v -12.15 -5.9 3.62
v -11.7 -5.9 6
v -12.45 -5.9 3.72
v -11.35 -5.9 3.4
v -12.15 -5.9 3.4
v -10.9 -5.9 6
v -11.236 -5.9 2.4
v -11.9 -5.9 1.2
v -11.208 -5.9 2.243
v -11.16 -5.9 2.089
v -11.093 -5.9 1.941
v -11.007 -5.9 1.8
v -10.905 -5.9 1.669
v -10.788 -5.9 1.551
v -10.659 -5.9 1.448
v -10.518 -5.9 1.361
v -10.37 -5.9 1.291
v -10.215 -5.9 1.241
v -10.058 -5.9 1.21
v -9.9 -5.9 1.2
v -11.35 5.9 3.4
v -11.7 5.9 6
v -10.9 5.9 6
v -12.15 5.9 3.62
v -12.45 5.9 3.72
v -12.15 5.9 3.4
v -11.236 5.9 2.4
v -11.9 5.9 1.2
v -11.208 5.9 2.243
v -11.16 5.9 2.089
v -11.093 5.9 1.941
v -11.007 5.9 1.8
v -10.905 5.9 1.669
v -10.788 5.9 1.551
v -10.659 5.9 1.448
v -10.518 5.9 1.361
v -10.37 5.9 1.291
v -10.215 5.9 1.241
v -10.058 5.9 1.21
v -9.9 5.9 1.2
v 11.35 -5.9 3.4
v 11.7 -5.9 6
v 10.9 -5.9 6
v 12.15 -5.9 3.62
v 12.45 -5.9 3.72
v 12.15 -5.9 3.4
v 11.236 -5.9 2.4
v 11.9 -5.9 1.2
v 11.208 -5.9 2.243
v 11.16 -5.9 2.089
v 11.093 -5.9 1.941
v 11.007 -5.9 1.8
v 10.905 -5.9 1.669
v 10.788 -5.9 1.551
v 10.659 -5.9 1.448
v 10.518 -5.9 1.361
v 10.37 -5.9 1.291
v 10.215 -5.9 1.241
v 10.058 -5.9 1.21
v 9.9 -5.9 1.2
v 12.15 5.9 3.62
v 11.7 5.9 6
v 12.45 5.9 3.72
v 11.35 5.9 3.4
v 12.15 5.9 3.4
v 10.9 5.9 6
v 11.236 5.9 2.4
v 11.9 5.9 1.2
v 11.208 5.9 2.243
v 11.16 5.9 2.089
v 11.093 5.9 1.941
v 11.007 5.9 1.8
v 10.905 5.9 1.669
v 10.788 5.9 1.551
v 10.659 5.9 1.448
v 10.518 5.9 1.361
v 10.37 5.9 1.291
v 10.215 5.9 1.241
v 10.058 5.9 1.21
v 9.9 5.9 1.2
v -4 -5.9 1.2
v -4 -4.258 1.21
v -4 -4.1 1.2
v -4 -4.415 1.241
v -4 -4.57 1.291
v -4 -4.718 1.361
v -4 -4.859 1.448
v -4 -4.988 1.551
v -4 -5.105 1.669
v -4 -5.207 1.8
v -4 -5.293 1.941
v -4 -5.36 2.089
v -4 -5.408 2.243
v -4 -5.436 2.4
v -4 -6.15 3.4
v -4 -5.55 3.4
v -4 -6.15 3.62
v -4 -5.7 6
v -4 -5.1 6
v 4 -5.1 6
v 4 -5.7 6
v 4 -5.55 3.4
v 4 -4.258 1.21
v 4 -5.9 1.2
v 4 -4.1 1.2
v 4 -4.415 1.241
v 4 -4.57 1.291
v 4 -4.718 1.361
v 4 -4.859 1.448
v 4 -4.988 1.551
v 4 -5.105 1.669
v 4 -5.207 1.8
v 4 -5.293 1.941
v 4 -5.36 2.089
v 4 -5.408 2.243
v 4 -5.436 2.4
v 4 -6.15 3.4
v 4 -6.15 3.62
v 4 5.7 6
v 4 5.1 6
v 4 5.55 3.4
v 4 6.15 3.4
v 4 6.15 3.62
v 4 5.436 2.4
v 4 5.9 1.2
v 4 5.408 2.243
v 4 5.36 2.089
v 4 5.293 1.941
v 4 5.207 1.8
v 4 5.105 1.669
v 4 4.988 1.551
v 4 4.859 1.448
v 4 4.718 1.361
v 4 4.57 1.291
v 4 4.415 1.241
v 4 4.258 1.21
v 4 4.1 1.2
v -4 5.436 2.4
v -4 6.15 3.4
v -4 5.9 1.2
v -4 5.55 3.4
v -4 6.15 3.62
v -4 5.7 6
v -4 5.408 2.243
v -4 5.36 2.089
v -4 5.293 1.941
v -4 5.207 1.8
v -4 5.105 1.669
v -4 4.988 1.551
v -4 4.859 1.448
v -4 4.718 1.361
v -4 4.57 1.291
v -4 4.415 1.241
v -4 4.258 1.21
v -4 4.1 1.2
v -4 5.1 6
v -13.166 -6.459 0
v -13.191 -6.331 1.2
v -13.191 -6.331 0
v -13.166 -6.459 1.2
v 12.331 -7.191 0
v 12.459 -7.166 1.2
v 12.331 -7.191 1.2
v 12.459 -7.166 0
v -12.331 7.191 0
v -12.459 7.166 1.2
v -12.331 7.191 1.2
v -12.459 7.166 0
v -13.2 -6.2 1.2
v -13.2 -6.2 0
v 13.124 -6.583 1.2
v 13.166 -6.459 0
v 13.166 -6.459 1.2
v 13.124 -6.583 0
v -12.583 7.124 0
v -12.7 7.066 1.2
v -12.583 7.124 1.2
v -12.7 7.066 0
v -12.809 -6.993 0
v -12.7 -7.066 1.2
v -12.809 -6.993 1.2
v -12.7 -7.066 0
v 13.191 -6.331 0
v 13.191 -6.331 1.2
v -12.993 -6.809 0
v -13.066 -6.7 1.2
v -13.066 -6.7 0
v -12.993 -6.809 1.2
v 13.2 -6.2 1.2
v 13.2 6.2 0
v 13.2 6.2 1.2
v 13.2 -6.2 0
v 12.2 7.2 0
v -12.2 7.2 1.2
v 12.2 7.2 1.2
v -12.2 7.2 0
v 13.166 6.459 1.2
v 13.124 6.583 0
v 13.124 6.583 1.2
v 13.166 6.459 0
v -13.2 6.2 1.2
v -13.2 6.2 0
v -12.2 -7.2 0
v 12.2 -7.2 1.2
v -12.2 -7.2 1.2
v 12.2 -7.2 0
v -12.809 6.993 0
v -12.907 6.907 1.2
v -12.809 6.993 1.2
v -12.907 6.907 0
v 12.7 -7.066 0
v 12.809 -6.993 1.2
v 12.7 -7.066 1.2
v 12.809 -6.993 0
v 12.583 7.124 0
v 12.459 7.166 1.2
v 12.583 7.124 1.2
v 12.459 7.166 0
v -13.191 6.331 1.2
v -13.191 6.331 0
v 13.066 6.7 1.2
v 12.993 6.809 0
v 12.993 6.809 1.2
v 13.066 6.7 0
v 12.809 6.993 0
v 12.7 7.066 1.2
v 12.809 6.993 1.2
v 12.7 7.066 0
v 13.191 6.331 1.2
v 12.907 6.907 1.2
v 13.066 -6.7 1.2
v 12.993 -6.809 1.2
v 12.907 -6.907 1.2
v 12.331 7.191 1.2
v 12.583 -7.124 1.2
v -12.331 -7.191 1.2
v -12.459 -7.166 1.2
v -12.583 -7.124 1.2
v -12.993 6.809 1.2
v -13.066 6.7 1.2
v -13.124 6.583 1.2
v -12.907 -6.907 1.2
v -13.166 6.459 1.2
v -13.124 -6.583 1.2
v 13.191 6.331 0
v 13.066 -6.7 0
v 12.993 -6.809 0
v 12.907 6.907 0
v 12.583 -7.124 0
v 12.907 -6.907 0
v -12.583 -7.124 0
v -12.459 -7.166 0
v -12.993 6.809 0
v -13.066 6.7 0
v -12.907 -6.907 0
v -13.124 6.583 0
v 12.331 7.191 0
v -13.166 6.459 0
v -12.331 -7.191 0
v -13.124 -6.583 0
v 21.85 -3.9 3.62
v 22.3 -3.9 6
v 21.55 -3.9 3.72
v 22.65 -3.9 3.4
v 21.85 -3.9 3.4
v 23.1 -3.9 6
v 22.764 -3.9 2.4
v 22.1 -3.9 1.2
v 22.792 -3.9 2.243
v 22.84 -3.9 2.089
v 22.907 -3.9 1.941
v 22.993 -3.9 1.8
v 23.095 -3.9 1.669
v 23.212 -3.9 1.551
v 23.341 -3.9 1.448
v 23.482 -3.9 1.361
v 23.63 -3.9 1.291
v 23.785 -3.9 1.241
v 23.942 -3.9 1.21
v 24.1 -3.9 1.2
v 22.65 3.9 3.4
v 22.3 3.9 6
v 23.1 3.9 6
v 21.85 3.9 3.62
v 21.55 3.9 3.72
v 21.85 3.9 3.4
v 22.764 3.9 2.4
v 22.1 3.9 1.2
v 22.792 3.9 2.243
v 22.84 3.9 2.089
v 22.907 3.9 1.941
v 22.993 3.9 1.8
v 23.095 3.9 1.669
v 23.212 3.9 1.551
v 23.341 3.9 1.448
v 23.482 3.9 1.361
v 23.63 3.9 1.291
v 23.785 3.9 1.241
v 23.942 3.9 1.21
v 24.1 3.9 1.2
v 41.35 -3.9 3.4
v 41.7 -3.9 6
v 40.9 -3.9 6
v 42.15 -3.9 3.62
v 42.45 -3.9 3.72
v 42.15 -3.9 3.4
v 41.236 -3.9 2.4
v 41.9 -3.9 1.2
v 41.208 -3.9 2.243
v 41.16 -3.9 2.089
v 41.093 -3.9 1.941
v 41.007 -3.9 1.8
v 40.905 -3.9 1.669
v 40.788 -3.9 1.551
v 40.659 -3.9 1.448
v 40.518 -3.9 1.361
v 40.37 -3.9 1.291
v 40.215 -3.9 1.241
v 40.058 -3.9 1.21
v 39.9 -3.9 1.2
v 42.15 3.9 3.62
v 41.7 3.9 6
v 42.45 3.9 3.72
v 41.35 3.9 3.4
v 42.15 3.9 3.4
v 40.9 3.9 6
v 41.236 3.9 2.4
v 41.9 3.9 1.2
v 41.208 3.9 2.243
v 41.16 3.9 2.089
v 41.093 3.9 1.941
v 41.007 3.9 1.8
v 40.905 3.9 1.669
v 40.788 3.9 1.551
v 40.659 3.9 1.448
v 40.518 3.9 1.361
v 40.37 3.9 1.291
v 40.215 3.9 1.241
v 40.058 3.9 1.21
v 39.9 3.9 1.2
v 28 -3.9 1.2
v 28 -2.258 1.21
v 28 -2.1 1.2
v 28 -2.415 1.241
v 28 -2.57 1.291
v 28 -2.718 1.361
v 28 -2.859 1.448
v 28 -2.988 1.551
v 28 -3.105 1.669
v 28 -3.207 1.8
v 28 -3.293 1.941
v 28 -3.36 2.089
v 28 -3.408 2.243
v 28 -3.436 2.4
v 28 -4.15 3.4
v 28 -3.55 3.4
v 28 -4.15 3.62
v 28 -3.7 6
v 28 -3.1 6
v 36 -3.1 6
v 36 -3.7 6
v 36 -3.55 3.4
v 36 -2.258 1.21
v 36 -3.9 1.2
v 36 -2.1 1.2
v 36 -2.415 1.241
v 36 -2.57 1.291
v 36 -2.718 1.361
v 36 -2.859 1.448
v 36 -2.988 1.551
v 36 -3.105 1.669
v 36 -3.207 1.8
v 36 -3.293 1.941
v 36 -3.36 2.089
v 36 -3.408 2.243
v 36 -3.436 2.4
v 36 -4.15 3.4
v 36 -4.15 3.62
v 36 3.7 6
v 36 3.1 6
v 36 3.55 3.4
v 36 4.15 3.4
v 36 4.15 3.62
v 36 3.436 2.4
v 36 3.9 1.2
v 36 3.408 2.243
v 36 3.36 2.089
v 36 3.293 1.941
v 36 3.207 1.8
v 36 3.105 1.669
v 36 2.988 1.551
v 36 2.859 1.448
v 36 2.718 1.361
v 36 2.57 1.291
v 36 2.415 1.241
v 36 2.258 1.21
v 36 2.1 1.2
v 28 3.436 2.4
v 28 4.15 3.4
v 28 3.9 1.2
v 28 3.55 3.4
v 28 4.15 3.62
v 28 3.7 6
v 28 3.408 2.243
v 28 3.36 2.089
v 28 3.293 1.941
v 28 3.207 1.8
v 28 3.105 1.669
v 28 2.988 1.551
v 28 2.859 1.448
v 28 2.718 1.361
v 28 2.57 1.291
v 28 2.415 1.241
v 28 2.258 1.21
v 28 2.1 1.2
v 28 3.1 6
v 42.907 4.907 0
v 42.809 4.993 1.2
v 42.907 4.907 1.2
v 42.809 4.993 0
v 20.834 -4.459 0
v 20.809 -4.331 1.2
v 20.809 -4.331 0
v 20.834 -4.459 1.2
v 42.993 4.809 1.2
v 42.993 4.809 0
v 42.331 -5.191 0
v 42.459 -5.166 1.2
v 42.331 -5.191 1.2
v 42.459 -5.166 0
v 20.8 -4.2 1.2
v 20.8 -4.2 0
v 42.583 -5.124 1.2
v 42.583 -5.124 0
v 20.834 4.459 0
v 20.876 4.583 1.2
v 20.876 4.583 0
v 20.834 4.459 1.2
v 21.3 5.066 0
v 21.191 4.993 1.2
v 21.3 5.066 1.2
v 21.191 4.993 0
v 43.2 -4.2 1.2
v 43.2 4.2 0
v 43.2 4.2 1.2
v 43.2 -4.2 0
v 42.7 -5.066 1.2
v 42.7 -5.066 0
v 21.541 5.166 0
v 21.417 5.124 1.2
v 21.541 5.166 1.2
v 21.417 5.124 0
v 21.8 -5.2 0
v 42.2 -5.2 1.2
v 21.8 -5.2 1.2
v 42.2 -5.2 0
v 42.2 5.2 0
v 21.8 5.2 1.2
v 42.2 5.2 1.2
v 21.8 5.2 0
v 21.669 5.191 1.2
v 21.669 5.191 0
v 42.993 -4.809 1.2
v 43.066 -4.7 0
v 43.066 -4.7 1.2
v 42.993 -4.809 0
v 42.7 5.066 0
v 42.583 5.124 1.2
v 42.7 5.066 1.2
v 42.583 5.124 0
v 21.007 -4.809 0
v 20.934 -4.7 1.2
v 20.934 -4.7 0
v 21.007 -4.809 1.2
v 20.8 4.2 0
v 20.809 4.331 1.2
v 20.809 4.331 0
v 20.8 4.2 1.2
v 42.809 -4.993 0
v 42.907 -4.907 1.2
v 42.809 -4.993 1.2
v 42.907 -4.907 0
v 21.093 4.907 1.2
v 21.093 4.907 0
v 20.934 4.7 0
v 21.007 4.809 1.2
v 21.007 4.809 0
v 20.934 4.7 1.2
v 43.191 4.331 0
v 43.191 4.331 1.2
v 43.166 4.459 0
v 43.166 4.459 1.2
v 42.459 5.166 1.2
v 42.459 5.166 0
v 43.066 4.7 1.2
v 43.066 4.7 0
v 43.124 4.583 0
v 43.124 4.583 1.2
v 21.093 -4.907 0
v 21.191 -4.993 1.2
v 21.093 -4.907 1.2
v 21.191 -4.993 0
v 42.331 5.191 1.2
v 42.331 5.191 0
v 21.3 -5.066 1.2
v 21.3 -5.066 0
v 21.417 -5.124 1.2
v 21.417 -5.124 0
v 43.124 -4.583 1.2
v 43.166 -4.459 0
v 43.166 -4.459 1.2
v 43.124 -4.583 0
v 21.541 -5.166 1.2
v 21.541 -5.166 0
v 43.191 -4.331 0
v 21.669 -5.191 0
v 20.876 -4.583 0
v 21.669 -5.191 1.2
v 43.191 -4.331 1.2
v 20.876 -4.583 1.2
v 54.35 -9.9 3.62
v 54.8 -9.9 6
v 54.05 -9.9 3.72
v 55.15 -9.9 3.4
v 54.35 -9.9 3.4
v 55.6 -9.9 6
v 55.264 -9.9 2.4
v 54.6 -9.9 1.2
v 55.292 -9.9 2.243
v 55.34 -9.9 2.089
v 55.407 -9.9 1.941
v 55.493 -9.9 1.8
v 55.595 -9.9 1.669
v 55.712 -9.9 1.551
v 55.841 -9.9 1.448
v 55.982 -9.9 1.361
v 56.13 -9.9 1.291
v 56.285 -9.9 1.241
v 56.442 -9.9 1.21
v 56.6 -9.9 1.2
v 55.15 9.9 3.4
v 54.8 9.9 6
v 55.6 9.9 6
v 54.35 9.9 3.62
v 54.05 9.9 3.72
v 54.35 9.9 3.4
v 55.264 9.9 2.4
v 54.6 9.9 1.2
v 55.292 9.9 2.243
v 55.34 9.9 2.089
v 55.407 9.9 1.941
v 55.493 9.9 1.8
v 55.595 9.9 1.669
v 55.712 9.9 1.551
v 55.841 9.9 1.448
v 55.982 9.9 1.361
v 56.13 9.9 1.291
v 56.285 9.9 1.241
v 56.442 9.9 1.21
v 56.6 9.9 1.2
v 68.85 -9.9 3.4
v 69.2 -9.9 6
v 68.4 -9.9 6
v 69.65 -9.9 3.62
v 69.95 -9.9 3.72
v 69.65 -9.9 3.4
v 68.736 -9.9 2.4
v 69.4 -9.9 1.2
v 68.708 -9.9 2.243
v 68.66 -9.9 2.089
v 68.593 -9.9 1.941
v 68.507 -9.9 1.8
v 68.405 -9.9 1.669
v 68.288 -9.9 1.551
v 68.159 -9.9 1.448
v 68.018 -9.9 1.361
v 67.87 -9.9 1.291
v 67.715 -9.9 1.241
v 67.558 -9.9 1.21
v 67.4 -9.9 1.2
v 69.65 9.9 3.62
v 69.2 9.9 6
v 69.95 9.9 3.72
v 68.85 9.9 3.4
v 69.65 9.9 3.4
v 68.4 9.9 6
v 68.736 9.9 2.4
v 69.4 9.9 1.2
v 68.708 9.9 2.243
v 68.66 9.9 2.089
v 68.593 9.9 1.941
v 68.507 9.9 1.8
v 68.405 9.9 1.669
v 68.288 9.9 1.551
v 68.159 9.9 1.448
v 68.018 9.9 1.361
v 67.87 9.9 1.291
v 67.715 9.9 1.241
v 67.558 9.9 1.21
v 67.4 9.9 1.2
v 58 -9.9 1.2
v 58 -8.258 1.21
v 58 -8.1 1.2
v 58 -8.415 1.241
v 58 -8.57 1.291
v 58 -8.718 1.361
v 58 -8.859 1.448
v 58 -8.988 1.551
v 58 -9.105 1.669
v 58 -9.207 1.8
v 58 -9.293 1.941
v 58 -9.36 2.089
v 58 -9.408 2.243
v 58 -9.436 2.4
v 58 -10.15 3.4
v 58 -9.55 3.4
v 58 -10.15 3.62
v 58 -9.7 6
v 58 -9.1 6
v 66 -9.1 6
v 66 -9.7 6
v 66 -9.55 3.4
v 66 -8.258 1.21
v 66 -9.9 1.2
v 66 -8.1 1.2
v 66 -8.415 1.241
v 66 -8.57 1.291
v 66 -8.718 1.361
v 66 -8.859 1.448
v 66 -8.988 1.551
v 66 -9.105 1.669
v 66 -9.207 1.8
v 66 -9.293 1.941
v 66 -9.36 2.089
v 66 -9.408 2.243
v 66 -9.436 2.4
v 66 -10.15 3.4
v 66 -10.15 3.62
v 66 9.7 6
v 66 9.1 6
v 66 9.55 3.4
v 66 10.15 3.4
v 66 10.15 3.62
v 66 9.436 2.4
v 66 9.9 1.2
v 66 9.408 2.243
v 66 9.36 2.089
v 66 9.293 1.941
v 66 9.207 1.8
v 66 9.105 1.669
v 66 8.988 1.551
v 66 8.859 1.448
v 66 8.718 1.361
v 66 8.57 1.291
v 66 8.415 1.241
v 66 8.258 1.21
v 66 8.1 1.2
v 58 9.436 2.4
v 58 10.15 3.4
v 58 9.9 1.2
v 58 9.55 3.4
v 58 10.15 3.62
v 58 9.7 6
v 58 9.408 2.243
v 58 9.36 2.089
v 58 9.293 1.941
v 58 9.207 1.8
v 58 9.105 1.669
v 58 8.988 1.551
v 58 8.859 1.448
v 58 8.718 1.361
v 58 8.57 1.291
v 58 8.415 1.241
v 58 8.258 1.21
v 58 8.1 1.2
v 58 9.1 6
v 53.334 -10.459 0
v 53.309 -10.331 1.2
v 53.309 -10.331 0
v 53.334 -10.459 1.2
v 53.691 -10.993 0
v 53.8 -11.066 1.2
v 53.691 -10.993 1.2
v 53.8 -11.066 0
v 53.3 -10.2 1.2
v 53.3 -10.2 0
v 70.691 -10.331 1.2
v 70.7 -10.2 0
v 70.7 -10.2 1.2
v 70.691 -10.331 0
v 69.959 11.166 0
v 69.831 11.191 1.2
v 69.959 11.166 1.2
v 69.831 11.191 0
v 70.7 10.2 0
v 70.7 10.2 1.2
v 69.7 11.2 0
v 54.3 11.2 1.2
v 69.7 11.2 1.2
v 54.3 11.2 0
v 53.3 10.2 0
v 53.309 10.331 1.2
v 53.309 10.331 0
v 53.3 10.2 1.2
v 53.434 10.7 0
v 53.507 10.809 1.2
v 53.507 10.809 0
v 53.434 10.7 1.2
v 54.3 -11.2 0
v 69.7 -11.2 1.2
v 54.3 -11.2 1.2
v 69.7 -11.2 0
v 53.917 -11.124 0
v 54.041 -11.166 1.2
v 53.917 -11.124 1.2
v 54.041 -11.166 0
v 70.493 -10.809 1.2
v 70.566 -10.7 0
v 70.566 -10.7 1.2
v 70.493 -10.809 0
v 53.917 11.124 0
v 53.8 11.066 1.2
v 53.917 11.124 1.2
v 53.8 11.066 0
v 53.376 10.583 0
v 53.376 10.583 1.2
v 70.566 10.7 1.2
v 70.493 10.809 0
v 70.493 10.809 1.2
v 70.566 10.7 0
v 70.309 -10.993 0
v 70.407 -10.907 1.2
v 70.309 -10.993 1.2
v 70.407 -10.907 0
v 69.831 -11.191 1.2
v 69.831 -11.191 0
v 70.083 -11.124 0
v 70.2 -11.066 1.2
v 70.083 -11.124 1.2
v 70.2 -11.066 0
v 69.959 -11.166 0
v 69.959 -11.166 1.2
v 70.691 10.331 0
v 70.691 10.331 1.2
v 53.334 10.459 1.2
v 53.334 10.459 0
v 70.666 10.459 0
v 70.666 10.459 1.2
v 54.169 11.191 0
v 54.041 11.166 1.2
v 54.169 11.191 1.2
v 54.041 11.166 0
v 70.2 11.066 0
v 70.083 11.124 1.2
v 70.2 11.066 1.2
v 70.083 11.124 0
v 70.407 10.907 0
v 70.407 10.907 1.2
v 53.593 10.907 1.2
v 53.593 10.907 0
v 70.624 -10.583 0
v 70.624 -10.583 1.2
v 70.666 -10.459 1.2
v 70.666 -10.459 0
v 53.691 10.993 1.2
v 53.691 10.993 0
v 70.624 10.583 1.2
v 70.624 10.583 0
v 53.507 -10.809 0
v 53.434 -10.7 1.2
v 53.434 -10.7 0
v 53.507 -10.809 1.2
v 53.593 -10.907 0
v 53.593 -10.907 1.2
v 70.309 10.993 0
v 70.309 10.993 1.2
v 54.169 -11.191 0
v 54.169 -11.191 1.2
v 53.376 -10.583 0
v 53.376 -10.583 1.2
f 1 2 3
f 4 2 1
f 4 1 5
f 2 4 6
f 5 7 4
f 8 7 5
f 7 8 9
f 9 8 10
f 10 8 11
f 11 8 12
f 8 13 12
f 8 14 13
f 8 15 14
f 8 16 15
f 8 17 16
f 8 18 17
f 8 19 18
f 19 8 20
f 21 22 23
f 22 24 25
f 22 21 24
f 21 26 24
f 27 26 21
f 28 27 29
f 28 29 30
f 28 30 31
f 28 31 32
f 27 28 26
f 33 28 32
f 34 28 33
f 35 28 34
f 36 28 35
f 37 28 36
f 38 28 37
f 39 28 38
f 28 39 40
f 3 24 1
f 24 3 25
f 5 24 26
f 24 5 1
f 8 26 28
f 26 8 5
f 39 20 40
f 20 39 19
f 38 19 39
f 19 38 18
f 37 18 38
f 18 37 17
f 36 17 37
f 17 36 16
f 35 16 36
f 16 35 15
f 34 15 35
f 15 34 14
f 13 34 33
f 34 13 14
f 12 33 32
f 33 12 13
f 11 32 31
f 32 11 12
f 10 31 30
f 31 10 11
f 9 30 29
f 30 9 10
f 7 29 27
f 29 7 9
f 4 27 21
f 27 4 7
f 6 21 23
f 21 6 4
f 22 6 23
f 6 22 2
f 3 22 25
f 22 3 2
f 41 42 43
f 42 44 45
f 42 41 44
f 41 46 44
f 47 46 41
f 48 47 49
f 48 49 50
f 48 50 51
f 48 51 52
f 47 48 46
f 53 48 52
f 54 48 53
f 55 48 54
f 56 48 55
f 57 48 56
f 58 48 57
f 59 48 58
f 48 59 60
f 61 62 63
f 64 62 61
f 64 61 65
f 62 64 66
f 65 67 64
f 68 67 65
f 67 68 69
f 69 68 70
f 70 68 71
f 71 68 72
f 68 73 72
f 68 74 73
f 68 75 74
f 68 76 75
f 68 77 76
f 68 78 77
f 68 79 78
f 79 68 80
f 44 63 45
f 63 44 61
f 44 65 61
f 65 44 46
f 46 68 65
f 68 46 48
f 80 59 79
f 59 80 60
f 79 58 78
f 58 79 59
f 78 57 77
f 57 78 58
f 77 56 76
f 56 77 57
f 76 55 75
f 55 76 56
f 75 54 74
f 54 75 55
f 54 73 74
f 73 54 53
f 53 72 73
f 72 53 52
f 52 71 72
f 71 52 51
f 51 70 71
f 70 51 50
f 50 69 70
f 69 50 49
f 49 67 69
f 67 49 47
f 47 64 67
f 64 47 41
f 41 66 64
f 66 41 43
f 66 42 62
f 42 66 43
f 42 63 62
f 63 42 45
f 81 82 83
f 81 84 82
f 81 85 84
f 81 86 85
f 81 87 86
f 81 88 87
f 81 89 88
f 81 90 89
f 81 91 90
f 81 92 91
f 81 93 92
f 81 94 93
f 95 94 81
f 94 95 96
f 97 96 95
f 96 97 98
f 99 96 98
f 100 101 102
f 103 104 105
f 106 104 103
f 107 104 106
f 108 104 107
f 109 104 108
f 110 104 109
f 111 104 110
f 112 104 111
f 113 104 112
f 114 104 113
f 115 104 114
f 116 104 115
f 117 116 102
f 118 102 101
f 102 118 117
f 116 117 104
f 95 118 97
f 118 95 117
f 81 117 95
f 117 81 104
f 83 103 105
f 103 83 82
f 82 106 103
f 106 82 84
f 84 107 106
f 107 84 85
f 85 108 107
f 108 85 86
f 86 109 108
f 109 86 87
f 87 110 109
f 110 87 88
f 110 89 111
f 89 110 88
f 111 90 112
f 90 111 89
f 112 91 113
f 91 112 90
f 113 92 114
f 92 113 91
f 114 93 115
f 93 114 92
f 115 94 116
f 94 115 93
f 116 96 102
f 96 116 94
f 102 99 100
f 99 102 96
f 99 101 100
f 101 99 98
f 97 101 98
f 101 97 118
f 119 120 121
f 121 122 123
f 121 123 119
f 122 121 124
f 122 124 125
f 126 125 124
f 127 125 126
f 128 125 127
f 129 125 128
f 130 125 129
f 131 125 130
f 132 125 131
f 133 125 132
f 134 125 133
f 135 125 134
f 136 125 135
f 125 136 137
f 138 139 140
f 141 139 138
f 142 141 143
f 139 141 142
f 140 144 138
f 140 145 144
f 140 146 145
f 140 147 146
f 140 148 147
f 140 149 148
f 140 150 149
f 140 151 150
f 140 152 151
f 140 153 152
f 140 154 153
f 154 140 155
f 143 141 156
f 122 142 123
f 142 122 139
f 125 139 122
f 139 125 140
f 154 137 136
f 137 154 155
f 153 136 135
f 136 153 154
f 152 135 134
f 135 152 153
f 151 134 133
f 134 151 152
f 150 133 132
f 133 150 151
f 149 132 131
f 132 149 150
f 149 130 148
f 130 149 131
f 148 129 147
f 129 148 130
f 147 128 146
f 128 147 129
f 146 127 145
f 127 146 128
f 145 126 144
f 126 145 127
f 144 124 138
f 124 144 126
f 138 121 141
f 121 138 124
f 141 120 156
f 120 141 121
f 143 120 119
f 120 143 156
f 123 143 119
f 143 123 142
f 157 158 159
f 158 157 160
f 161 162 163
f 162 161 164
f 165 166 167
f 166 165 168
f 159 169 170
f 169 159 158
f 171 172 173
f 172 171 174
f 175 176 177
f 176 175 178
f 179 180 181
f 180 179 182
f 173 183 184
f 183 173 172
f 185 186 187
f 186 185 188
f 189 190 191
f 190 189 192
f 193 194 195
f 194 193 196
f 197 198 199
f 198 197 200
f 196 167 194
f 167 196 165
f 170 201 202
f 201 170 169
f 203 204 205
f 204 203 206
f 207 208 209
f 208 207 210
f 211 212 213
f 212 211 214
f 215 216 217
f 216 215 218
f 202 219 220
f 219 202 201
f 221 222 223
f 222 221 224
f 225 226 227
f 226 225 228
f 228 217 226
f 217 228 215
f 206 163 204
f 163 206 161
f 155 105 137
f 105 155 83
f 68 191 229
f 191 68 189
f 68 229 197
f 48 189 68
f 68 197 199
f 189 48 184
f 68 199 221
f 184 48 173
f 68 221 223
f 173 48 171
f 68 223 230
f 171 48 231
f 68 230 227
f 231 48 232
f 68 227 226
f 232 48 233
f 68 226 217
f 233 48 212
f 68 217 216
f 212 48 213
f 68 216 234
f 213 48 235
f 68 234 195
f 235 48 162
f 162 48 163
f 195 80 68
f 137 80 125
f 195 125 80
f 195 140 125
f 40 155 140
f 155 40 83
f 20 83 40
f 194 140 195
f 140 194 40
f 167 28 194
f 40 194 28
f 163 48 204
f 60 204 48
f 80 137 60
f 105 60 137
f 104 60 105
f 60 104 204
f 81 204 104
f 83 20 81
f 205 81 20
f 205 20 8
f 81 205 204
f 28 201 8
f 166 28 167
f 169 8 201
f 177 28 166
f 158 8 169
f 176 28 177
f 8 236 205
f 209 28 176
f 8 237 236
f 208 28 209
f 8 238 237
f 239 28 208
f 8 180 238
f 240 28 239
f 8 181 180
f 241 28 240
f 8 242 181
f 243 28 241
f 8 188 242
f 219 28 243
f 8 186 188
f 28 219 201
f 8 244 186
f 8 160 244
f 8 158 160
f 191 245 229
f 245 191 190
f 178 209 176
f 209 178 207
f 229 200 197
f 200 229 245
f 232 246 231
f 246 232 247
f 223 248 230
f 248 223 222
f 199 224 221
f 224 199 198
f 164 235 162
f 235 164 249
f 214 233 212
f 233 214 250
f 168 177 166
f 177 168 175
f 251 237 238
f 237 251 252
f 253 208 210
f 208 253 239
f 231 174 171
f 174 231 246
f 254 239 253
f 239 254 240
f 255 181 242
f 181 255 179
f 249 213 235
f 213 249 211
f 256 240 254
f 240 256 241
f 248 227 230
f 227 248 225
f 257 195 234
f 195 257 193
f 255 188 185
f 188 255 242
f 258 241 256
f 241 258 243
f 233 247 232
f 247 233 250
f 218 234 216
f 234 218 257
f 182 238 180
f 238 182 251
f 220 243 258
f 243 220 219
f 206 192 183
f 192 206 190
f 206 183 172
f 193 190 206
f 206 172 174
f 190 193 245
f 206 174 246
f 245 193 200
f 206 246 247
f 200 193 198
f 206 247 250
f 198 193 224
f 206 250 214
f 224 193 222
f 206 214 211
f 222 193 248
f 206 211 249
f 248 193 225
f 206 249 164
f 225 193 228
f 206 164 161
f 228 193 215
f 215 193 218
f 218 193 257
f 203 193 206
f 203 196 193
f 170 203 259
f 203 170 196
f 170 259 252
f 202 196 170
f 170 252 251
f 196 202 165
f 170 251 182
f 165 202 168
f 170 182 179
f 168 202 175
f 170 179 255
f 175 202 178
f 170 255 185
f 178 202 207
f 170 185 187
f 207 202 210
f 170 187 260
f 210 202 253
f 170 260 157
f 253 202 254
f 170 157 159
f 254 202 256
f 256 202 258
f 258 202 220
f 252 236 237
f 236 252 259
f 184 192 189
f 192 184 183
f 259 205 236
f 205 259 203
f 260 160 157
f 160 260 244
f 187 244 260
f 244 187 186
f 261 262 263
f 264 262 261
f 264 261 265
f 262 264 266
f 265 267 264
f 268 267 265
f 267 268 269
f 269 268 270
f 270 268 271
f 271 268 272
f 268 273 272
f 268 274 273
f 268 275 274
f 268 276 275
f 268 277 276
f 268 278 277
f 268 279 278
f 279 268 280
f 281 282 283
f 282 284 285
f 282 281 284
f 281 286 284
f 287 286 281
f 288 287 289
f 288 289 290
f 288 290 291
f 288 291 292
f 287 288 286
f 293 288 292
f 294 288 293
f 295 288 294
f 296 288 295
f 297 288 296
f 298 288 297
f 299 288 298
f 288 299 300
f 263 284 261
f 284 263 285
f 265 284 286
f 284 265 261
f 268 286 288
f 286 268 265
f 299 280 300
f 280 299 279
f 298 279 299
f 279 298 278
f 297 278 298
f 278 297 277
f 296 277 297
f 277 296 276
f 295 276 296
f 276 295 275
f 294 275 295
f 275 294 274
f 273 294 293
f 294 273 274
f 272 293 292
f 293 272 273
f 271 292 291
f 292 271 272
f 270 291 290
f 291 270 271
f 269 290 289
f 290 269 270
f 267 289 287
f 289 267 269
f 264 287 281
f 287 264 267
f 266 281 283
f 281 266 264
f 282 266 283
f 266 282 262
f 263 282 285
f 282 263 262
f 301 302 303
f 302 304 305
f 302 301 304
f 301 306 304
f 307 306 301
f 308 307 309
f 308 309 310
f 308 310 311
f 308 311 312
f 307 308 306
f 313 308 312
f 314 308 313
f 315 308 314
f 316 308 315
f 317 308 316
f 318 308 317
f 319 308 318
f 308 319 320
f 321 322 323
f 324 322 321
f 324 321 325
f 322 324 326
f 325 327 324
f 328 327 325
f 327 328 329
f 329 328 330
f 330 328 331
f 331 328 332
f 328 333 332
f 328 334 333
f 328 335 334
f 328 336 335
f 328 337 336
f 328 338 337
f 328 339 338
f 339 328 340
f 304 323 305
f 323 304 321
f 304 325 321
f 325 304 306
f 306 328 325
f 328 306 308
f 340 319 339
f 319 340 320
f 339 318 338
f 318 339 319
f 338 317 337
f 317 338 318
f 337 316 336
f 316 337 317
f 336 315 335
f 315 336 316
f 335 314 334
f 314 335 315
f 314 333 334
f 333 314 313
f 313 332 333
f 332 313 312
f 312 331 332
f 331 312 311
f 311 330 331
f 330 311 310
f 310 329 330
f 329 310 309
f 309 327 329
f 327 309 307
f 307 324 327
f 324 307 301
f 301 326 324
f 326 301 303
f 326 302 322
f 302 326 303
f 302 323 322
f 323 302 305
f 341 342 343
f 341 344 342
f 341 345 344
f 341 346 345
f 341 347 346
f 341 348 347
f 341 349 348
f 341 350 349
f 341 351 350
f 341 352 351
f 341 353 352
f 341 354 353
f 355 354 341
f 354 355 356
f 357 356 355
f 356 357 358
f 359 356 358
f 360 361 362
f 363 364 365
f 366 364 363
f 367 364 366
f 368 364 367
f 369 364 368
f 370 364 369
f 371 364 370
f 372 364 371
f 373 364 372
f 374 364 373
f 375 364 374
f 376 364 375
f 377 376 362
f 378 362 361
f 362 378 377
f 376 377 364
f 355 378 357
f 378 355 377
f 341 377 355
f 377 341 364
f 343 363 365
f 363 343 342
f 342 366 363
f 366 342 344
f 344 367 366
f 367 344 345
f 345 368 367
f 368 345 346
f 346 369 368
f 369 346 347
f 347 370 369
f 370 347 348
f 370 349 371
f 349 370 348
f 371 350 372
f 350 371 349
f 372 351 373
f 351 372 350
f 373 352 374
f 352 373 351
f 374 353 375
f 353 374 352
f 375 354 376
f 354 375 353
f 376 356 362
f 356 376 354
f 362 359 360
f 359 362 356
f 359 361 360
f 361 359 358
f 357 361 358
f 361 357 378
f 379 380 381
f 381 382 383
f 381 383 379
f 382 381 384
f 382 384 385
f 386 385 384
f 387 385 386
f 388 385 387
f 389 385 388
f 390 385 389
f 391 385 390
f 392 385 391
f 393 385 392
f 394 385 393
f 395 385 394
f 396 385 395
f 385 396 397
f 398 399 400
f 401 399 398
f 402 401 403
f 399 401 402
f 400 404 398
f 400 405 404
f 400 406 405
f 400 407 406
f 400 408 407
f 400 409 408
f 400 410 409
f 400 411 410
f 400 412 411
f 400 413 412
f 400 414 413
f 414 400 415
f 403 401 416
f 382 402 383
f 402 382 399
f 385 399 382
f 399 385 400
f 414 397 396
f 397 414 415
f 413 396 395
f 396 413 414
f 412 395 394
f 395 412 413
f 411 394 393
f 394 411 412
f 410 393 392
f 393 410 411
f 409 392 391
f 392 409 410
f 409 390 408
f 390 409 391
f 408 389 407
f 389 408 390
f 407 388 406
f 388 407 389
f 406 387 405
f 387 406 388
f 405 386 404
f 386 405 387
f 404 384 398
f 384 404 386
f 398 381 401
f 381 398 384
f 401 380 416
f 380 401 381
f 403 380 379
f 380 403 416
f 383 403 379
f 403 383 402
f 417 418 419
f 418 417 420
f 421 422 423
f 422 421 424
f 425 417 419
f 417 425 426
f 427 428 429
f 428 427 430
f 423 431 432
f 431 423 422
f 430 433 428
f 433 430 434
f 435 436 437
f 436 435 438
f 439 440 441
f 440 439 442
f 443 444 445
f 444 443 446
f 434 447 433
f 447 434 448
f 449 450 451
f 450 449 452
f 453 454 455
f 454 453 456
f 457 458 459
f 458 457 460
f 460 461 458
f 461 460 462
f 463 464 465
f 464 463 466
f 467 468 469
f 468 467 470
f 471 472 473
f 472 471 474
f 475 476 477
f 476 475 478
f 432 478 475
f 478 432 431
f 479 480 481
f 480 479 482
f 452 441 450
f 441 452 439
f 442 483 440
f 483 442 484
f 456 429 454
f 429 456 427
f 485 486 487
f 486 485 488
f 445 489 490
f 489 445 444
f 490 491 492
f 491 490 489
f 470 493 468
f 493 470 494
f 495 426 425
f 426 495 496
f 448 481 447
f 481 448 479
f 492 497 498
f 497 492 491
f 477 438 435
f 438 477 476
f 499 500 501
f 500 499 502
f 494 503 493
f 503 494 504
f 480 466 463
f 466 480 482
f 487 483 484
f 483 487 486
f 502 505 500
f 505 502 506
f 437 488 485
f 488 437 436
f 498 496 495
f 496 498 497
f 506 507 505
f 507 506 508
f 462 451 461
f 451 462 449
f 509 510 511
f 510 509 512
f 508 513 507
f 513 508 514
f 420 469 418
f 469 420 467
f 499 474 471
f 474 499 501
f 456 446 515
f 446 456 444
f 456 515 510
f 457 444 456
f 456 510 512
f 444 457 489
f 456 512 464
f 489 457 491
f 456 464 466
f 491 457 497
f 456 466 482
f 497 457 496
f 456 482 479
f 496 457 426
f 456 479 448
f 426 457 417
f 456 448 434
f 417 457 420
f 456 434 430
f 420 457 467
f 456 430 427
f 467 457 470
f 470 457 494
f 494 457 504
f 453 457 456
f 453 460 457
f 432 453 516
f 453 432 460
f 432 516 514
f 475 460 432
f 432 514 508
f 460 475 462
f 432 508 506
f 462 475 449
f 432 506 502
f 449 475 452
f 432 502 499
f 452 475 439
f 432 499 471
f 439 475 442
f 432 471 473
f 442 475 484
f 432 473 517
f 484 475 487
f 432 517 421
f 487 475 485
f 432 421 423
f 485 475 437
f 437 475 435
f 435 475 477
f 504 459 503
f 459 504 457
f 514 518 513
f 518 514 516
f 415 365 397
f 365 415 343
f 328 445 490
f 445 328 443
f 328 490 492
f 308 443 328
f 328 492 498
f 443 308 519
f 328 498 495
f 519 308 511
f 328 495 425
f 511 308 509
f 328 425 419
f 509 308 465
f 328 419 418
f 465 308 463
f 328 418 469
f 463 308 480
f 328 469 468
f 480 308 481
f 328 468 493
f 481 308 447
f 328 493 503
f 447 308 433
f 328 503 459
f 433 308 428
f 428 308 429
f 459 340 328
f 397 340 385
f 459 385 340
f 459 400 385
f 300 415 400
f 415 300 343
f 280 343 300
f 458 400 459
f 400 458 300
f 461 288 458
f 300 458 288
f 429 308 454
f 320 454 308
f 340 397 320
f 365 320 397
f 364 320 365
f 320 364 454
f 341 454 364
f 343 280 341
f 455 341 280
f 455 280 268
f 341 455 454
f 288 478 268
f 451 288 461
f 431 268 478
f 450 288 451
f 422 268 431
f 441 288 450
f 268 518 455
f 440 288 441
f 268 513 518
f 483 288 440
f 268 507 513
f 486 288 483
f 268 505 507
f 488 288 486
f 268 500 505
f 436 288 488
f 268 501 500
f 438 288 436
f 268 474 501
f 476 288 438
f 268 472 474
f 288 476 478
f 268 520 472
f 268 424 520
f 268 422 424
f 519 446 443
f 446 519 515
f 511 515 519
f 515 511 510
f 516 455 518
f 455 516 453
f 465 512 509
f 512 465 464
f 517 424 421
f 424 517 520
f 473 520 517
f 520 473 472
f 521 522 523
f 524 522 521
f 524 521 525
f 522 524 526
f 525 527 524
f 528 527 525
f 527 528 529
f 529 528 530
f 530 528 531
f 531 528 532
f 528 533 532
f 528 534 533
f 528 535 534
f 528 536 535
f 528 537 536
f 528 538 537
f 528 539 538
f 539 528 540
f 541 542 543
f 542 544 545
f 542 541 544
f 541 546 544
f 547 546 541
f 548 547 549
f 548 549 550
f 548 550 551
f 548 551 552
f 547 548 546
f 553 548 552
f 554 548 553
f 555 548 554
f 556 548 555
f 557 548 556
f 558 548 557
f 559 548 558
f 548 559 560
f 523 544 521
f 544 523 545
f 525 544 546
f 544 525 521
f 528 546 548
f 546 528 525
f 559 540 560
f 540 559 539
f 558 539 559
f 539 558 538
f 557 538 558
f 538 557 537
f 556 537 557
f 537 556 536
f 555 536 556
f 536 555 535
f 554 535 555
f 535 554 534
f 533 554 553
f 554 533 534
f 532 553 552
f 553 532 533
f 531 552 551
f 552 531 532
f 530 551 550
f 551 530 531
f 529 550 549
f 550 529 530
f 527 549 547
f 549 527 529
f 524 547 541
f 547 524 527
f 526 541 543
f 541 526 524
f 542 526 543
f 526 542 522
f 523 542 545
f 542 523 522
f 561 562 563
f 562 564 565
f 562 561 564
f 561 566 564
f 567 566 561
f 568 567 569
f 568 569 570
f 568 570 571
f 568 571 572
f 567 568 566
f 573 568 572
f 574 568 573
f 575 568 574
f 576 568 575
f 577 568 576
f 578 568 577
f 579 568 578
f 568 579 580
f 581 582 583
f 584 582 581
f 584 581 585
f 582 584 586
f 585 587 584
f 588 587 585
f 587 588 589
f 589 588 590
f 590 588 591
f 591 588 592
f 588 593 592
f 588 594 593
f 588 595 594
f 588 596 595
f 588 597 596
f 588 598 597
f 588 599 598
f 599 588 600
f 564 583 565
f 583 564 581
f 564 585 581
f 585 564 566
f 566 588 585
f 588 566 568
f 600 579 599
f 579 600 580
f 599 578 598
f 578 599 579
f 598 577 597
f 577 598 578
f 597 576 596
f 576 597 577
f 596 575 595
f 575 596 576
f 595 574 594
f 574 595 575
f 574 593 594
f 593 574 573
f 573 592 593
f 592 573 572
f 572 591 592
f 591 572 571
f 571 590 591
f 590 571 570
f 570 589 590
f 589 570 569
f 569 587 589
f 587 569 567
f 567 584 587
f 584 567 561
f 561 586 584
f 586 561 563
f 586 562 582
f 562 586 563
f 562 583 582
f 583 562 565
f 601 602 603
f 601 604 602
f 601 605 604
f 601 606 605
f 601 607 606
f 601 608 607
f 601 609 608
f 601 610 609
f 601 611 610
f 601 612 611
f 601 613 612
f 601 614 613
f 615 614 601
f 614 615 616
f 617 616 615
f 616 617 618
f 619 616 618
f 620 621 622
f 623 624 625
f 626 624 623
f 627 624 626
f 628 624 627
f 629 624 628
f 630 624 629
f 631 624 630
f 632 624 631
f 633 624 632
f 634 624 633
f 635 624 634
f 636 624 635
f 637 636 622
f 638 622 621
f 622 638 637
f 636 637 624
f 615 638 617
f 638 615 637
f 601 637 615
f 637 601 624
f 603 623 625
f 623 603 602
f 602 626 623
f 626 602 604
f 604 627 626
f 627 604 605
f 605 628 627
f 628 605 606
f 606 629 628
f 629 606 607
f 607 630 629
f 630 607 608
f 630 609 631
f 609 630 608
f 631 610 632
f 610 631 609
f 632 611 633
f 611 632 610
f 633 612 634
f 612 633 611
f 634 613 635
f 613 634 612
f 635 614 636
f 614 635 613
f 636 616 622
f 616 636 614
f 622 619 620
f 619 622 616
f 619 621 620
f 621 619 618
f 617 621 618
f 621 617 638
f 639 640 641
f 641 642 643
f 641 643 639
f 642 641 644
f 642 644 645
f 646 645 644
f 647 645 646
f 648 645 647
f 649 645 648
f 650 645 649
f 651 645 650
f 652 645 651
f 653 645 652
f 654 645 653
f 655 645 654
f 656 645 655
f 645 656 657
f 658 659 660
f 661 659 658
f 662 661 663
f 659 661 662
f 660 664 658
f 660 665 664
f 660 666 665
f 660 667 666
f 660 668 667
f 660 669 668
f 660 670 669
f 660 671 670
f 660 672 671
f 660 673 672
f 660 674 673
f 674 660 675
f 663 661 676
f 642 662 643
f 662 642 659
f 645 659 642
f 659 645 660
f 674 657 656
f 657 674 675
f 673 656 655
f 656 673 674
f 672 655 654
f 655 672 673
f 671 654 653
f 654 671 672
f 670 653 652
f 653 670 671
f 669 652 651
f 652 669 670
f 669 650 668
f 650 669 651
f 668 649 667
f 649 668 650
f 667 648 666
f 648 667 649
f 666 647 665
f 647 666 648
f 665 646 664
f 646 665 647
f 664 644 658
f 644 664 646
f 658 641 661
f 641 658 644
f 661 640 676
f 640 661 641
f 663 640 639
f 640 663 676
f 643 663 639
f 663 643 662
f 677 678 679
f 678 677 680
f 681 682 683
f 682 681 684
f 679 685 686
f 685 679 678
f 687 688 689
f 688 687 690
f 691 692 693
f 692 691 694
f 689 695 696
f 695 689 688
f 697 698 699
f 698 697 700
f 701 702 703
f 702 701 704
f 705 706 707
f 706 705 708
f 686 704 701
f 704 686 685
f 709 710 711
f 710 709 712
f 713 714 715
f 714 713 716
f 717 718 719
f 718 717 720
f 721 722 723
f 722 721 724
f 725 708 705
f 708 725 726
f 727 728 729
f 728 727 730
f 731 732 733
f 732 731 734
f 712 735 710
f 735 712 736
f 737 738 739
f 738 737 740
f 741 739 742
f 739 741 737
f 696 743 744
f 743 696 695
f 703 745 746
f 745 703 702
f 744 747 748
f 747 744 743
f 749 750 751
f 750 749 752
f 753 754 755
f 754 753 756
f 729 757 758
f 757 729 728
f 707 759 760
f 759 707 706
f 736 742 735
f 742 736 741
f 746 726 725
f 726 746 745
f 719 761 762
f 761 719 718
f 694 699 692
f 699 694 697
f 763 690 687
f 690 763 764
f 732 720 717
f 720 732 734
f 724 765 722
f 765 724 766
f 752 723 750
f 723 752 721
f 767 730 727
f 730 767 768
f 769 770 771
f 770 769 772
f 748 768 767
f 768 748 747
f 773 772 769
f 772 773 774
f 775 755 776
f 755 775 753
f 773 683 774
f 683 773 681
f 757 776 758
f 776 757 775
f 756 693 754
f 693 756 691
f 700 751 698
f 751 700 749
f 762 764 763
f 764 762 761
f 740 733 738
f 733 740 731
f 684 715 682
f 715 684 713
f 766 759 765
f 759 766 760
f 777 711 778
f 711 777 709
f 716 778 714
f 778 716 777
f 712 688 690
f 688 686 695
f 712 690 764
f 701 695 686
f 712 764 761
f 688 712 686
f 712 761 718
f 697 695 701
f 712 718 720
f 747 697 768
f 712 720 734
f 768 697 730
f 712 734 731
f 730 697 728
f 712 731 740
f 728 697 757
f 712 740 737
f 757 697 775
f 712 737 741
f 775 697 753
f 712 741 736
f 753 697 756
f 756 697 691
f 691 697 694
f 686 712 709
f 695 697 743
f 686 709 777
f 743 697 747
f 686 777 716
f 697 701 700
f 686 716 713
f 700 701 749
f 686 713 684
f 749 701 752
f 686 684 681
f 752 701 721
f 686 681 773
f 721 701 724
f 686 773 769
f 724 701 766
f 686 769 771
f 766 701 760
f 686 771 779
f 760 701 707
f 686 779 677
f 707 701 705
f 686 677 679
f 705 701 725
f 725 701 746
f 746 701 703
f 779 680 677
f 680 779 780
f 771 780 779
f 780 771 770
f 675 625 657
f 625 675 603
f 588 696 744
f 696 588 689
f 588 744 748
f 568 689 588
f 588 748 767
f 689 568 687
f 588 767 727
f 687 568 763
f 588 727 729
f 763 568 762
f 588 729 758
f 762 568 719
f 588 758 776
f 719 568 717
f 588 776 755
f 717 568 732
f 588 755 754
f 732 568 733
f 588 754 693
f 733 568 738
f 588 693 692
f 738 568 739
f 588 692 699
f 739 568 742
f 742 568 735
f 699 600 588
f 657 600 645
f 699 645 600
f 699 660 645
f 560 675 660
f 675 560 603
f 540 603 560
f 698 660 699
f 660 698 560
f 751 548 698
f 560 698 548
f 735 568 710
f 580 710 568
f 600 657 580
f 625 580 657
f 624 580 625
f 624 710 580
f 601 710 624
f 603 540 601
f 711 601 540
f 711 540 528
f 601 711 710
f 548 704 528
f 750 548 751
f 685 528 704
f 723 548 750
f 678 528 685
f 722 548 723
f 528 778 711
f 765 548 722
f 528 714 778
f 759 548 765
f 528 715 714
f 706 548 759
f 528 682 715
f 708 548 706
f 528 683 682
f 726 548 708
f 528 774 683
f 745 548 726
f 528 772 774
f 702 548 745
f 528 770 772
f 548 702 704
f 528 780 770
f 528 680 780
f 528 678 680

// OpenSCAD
// Reinforced clip roots, in print orientation. Left to right: HDMI, SD, USB.
use <../src/router_case.scad>
covers_scene();
